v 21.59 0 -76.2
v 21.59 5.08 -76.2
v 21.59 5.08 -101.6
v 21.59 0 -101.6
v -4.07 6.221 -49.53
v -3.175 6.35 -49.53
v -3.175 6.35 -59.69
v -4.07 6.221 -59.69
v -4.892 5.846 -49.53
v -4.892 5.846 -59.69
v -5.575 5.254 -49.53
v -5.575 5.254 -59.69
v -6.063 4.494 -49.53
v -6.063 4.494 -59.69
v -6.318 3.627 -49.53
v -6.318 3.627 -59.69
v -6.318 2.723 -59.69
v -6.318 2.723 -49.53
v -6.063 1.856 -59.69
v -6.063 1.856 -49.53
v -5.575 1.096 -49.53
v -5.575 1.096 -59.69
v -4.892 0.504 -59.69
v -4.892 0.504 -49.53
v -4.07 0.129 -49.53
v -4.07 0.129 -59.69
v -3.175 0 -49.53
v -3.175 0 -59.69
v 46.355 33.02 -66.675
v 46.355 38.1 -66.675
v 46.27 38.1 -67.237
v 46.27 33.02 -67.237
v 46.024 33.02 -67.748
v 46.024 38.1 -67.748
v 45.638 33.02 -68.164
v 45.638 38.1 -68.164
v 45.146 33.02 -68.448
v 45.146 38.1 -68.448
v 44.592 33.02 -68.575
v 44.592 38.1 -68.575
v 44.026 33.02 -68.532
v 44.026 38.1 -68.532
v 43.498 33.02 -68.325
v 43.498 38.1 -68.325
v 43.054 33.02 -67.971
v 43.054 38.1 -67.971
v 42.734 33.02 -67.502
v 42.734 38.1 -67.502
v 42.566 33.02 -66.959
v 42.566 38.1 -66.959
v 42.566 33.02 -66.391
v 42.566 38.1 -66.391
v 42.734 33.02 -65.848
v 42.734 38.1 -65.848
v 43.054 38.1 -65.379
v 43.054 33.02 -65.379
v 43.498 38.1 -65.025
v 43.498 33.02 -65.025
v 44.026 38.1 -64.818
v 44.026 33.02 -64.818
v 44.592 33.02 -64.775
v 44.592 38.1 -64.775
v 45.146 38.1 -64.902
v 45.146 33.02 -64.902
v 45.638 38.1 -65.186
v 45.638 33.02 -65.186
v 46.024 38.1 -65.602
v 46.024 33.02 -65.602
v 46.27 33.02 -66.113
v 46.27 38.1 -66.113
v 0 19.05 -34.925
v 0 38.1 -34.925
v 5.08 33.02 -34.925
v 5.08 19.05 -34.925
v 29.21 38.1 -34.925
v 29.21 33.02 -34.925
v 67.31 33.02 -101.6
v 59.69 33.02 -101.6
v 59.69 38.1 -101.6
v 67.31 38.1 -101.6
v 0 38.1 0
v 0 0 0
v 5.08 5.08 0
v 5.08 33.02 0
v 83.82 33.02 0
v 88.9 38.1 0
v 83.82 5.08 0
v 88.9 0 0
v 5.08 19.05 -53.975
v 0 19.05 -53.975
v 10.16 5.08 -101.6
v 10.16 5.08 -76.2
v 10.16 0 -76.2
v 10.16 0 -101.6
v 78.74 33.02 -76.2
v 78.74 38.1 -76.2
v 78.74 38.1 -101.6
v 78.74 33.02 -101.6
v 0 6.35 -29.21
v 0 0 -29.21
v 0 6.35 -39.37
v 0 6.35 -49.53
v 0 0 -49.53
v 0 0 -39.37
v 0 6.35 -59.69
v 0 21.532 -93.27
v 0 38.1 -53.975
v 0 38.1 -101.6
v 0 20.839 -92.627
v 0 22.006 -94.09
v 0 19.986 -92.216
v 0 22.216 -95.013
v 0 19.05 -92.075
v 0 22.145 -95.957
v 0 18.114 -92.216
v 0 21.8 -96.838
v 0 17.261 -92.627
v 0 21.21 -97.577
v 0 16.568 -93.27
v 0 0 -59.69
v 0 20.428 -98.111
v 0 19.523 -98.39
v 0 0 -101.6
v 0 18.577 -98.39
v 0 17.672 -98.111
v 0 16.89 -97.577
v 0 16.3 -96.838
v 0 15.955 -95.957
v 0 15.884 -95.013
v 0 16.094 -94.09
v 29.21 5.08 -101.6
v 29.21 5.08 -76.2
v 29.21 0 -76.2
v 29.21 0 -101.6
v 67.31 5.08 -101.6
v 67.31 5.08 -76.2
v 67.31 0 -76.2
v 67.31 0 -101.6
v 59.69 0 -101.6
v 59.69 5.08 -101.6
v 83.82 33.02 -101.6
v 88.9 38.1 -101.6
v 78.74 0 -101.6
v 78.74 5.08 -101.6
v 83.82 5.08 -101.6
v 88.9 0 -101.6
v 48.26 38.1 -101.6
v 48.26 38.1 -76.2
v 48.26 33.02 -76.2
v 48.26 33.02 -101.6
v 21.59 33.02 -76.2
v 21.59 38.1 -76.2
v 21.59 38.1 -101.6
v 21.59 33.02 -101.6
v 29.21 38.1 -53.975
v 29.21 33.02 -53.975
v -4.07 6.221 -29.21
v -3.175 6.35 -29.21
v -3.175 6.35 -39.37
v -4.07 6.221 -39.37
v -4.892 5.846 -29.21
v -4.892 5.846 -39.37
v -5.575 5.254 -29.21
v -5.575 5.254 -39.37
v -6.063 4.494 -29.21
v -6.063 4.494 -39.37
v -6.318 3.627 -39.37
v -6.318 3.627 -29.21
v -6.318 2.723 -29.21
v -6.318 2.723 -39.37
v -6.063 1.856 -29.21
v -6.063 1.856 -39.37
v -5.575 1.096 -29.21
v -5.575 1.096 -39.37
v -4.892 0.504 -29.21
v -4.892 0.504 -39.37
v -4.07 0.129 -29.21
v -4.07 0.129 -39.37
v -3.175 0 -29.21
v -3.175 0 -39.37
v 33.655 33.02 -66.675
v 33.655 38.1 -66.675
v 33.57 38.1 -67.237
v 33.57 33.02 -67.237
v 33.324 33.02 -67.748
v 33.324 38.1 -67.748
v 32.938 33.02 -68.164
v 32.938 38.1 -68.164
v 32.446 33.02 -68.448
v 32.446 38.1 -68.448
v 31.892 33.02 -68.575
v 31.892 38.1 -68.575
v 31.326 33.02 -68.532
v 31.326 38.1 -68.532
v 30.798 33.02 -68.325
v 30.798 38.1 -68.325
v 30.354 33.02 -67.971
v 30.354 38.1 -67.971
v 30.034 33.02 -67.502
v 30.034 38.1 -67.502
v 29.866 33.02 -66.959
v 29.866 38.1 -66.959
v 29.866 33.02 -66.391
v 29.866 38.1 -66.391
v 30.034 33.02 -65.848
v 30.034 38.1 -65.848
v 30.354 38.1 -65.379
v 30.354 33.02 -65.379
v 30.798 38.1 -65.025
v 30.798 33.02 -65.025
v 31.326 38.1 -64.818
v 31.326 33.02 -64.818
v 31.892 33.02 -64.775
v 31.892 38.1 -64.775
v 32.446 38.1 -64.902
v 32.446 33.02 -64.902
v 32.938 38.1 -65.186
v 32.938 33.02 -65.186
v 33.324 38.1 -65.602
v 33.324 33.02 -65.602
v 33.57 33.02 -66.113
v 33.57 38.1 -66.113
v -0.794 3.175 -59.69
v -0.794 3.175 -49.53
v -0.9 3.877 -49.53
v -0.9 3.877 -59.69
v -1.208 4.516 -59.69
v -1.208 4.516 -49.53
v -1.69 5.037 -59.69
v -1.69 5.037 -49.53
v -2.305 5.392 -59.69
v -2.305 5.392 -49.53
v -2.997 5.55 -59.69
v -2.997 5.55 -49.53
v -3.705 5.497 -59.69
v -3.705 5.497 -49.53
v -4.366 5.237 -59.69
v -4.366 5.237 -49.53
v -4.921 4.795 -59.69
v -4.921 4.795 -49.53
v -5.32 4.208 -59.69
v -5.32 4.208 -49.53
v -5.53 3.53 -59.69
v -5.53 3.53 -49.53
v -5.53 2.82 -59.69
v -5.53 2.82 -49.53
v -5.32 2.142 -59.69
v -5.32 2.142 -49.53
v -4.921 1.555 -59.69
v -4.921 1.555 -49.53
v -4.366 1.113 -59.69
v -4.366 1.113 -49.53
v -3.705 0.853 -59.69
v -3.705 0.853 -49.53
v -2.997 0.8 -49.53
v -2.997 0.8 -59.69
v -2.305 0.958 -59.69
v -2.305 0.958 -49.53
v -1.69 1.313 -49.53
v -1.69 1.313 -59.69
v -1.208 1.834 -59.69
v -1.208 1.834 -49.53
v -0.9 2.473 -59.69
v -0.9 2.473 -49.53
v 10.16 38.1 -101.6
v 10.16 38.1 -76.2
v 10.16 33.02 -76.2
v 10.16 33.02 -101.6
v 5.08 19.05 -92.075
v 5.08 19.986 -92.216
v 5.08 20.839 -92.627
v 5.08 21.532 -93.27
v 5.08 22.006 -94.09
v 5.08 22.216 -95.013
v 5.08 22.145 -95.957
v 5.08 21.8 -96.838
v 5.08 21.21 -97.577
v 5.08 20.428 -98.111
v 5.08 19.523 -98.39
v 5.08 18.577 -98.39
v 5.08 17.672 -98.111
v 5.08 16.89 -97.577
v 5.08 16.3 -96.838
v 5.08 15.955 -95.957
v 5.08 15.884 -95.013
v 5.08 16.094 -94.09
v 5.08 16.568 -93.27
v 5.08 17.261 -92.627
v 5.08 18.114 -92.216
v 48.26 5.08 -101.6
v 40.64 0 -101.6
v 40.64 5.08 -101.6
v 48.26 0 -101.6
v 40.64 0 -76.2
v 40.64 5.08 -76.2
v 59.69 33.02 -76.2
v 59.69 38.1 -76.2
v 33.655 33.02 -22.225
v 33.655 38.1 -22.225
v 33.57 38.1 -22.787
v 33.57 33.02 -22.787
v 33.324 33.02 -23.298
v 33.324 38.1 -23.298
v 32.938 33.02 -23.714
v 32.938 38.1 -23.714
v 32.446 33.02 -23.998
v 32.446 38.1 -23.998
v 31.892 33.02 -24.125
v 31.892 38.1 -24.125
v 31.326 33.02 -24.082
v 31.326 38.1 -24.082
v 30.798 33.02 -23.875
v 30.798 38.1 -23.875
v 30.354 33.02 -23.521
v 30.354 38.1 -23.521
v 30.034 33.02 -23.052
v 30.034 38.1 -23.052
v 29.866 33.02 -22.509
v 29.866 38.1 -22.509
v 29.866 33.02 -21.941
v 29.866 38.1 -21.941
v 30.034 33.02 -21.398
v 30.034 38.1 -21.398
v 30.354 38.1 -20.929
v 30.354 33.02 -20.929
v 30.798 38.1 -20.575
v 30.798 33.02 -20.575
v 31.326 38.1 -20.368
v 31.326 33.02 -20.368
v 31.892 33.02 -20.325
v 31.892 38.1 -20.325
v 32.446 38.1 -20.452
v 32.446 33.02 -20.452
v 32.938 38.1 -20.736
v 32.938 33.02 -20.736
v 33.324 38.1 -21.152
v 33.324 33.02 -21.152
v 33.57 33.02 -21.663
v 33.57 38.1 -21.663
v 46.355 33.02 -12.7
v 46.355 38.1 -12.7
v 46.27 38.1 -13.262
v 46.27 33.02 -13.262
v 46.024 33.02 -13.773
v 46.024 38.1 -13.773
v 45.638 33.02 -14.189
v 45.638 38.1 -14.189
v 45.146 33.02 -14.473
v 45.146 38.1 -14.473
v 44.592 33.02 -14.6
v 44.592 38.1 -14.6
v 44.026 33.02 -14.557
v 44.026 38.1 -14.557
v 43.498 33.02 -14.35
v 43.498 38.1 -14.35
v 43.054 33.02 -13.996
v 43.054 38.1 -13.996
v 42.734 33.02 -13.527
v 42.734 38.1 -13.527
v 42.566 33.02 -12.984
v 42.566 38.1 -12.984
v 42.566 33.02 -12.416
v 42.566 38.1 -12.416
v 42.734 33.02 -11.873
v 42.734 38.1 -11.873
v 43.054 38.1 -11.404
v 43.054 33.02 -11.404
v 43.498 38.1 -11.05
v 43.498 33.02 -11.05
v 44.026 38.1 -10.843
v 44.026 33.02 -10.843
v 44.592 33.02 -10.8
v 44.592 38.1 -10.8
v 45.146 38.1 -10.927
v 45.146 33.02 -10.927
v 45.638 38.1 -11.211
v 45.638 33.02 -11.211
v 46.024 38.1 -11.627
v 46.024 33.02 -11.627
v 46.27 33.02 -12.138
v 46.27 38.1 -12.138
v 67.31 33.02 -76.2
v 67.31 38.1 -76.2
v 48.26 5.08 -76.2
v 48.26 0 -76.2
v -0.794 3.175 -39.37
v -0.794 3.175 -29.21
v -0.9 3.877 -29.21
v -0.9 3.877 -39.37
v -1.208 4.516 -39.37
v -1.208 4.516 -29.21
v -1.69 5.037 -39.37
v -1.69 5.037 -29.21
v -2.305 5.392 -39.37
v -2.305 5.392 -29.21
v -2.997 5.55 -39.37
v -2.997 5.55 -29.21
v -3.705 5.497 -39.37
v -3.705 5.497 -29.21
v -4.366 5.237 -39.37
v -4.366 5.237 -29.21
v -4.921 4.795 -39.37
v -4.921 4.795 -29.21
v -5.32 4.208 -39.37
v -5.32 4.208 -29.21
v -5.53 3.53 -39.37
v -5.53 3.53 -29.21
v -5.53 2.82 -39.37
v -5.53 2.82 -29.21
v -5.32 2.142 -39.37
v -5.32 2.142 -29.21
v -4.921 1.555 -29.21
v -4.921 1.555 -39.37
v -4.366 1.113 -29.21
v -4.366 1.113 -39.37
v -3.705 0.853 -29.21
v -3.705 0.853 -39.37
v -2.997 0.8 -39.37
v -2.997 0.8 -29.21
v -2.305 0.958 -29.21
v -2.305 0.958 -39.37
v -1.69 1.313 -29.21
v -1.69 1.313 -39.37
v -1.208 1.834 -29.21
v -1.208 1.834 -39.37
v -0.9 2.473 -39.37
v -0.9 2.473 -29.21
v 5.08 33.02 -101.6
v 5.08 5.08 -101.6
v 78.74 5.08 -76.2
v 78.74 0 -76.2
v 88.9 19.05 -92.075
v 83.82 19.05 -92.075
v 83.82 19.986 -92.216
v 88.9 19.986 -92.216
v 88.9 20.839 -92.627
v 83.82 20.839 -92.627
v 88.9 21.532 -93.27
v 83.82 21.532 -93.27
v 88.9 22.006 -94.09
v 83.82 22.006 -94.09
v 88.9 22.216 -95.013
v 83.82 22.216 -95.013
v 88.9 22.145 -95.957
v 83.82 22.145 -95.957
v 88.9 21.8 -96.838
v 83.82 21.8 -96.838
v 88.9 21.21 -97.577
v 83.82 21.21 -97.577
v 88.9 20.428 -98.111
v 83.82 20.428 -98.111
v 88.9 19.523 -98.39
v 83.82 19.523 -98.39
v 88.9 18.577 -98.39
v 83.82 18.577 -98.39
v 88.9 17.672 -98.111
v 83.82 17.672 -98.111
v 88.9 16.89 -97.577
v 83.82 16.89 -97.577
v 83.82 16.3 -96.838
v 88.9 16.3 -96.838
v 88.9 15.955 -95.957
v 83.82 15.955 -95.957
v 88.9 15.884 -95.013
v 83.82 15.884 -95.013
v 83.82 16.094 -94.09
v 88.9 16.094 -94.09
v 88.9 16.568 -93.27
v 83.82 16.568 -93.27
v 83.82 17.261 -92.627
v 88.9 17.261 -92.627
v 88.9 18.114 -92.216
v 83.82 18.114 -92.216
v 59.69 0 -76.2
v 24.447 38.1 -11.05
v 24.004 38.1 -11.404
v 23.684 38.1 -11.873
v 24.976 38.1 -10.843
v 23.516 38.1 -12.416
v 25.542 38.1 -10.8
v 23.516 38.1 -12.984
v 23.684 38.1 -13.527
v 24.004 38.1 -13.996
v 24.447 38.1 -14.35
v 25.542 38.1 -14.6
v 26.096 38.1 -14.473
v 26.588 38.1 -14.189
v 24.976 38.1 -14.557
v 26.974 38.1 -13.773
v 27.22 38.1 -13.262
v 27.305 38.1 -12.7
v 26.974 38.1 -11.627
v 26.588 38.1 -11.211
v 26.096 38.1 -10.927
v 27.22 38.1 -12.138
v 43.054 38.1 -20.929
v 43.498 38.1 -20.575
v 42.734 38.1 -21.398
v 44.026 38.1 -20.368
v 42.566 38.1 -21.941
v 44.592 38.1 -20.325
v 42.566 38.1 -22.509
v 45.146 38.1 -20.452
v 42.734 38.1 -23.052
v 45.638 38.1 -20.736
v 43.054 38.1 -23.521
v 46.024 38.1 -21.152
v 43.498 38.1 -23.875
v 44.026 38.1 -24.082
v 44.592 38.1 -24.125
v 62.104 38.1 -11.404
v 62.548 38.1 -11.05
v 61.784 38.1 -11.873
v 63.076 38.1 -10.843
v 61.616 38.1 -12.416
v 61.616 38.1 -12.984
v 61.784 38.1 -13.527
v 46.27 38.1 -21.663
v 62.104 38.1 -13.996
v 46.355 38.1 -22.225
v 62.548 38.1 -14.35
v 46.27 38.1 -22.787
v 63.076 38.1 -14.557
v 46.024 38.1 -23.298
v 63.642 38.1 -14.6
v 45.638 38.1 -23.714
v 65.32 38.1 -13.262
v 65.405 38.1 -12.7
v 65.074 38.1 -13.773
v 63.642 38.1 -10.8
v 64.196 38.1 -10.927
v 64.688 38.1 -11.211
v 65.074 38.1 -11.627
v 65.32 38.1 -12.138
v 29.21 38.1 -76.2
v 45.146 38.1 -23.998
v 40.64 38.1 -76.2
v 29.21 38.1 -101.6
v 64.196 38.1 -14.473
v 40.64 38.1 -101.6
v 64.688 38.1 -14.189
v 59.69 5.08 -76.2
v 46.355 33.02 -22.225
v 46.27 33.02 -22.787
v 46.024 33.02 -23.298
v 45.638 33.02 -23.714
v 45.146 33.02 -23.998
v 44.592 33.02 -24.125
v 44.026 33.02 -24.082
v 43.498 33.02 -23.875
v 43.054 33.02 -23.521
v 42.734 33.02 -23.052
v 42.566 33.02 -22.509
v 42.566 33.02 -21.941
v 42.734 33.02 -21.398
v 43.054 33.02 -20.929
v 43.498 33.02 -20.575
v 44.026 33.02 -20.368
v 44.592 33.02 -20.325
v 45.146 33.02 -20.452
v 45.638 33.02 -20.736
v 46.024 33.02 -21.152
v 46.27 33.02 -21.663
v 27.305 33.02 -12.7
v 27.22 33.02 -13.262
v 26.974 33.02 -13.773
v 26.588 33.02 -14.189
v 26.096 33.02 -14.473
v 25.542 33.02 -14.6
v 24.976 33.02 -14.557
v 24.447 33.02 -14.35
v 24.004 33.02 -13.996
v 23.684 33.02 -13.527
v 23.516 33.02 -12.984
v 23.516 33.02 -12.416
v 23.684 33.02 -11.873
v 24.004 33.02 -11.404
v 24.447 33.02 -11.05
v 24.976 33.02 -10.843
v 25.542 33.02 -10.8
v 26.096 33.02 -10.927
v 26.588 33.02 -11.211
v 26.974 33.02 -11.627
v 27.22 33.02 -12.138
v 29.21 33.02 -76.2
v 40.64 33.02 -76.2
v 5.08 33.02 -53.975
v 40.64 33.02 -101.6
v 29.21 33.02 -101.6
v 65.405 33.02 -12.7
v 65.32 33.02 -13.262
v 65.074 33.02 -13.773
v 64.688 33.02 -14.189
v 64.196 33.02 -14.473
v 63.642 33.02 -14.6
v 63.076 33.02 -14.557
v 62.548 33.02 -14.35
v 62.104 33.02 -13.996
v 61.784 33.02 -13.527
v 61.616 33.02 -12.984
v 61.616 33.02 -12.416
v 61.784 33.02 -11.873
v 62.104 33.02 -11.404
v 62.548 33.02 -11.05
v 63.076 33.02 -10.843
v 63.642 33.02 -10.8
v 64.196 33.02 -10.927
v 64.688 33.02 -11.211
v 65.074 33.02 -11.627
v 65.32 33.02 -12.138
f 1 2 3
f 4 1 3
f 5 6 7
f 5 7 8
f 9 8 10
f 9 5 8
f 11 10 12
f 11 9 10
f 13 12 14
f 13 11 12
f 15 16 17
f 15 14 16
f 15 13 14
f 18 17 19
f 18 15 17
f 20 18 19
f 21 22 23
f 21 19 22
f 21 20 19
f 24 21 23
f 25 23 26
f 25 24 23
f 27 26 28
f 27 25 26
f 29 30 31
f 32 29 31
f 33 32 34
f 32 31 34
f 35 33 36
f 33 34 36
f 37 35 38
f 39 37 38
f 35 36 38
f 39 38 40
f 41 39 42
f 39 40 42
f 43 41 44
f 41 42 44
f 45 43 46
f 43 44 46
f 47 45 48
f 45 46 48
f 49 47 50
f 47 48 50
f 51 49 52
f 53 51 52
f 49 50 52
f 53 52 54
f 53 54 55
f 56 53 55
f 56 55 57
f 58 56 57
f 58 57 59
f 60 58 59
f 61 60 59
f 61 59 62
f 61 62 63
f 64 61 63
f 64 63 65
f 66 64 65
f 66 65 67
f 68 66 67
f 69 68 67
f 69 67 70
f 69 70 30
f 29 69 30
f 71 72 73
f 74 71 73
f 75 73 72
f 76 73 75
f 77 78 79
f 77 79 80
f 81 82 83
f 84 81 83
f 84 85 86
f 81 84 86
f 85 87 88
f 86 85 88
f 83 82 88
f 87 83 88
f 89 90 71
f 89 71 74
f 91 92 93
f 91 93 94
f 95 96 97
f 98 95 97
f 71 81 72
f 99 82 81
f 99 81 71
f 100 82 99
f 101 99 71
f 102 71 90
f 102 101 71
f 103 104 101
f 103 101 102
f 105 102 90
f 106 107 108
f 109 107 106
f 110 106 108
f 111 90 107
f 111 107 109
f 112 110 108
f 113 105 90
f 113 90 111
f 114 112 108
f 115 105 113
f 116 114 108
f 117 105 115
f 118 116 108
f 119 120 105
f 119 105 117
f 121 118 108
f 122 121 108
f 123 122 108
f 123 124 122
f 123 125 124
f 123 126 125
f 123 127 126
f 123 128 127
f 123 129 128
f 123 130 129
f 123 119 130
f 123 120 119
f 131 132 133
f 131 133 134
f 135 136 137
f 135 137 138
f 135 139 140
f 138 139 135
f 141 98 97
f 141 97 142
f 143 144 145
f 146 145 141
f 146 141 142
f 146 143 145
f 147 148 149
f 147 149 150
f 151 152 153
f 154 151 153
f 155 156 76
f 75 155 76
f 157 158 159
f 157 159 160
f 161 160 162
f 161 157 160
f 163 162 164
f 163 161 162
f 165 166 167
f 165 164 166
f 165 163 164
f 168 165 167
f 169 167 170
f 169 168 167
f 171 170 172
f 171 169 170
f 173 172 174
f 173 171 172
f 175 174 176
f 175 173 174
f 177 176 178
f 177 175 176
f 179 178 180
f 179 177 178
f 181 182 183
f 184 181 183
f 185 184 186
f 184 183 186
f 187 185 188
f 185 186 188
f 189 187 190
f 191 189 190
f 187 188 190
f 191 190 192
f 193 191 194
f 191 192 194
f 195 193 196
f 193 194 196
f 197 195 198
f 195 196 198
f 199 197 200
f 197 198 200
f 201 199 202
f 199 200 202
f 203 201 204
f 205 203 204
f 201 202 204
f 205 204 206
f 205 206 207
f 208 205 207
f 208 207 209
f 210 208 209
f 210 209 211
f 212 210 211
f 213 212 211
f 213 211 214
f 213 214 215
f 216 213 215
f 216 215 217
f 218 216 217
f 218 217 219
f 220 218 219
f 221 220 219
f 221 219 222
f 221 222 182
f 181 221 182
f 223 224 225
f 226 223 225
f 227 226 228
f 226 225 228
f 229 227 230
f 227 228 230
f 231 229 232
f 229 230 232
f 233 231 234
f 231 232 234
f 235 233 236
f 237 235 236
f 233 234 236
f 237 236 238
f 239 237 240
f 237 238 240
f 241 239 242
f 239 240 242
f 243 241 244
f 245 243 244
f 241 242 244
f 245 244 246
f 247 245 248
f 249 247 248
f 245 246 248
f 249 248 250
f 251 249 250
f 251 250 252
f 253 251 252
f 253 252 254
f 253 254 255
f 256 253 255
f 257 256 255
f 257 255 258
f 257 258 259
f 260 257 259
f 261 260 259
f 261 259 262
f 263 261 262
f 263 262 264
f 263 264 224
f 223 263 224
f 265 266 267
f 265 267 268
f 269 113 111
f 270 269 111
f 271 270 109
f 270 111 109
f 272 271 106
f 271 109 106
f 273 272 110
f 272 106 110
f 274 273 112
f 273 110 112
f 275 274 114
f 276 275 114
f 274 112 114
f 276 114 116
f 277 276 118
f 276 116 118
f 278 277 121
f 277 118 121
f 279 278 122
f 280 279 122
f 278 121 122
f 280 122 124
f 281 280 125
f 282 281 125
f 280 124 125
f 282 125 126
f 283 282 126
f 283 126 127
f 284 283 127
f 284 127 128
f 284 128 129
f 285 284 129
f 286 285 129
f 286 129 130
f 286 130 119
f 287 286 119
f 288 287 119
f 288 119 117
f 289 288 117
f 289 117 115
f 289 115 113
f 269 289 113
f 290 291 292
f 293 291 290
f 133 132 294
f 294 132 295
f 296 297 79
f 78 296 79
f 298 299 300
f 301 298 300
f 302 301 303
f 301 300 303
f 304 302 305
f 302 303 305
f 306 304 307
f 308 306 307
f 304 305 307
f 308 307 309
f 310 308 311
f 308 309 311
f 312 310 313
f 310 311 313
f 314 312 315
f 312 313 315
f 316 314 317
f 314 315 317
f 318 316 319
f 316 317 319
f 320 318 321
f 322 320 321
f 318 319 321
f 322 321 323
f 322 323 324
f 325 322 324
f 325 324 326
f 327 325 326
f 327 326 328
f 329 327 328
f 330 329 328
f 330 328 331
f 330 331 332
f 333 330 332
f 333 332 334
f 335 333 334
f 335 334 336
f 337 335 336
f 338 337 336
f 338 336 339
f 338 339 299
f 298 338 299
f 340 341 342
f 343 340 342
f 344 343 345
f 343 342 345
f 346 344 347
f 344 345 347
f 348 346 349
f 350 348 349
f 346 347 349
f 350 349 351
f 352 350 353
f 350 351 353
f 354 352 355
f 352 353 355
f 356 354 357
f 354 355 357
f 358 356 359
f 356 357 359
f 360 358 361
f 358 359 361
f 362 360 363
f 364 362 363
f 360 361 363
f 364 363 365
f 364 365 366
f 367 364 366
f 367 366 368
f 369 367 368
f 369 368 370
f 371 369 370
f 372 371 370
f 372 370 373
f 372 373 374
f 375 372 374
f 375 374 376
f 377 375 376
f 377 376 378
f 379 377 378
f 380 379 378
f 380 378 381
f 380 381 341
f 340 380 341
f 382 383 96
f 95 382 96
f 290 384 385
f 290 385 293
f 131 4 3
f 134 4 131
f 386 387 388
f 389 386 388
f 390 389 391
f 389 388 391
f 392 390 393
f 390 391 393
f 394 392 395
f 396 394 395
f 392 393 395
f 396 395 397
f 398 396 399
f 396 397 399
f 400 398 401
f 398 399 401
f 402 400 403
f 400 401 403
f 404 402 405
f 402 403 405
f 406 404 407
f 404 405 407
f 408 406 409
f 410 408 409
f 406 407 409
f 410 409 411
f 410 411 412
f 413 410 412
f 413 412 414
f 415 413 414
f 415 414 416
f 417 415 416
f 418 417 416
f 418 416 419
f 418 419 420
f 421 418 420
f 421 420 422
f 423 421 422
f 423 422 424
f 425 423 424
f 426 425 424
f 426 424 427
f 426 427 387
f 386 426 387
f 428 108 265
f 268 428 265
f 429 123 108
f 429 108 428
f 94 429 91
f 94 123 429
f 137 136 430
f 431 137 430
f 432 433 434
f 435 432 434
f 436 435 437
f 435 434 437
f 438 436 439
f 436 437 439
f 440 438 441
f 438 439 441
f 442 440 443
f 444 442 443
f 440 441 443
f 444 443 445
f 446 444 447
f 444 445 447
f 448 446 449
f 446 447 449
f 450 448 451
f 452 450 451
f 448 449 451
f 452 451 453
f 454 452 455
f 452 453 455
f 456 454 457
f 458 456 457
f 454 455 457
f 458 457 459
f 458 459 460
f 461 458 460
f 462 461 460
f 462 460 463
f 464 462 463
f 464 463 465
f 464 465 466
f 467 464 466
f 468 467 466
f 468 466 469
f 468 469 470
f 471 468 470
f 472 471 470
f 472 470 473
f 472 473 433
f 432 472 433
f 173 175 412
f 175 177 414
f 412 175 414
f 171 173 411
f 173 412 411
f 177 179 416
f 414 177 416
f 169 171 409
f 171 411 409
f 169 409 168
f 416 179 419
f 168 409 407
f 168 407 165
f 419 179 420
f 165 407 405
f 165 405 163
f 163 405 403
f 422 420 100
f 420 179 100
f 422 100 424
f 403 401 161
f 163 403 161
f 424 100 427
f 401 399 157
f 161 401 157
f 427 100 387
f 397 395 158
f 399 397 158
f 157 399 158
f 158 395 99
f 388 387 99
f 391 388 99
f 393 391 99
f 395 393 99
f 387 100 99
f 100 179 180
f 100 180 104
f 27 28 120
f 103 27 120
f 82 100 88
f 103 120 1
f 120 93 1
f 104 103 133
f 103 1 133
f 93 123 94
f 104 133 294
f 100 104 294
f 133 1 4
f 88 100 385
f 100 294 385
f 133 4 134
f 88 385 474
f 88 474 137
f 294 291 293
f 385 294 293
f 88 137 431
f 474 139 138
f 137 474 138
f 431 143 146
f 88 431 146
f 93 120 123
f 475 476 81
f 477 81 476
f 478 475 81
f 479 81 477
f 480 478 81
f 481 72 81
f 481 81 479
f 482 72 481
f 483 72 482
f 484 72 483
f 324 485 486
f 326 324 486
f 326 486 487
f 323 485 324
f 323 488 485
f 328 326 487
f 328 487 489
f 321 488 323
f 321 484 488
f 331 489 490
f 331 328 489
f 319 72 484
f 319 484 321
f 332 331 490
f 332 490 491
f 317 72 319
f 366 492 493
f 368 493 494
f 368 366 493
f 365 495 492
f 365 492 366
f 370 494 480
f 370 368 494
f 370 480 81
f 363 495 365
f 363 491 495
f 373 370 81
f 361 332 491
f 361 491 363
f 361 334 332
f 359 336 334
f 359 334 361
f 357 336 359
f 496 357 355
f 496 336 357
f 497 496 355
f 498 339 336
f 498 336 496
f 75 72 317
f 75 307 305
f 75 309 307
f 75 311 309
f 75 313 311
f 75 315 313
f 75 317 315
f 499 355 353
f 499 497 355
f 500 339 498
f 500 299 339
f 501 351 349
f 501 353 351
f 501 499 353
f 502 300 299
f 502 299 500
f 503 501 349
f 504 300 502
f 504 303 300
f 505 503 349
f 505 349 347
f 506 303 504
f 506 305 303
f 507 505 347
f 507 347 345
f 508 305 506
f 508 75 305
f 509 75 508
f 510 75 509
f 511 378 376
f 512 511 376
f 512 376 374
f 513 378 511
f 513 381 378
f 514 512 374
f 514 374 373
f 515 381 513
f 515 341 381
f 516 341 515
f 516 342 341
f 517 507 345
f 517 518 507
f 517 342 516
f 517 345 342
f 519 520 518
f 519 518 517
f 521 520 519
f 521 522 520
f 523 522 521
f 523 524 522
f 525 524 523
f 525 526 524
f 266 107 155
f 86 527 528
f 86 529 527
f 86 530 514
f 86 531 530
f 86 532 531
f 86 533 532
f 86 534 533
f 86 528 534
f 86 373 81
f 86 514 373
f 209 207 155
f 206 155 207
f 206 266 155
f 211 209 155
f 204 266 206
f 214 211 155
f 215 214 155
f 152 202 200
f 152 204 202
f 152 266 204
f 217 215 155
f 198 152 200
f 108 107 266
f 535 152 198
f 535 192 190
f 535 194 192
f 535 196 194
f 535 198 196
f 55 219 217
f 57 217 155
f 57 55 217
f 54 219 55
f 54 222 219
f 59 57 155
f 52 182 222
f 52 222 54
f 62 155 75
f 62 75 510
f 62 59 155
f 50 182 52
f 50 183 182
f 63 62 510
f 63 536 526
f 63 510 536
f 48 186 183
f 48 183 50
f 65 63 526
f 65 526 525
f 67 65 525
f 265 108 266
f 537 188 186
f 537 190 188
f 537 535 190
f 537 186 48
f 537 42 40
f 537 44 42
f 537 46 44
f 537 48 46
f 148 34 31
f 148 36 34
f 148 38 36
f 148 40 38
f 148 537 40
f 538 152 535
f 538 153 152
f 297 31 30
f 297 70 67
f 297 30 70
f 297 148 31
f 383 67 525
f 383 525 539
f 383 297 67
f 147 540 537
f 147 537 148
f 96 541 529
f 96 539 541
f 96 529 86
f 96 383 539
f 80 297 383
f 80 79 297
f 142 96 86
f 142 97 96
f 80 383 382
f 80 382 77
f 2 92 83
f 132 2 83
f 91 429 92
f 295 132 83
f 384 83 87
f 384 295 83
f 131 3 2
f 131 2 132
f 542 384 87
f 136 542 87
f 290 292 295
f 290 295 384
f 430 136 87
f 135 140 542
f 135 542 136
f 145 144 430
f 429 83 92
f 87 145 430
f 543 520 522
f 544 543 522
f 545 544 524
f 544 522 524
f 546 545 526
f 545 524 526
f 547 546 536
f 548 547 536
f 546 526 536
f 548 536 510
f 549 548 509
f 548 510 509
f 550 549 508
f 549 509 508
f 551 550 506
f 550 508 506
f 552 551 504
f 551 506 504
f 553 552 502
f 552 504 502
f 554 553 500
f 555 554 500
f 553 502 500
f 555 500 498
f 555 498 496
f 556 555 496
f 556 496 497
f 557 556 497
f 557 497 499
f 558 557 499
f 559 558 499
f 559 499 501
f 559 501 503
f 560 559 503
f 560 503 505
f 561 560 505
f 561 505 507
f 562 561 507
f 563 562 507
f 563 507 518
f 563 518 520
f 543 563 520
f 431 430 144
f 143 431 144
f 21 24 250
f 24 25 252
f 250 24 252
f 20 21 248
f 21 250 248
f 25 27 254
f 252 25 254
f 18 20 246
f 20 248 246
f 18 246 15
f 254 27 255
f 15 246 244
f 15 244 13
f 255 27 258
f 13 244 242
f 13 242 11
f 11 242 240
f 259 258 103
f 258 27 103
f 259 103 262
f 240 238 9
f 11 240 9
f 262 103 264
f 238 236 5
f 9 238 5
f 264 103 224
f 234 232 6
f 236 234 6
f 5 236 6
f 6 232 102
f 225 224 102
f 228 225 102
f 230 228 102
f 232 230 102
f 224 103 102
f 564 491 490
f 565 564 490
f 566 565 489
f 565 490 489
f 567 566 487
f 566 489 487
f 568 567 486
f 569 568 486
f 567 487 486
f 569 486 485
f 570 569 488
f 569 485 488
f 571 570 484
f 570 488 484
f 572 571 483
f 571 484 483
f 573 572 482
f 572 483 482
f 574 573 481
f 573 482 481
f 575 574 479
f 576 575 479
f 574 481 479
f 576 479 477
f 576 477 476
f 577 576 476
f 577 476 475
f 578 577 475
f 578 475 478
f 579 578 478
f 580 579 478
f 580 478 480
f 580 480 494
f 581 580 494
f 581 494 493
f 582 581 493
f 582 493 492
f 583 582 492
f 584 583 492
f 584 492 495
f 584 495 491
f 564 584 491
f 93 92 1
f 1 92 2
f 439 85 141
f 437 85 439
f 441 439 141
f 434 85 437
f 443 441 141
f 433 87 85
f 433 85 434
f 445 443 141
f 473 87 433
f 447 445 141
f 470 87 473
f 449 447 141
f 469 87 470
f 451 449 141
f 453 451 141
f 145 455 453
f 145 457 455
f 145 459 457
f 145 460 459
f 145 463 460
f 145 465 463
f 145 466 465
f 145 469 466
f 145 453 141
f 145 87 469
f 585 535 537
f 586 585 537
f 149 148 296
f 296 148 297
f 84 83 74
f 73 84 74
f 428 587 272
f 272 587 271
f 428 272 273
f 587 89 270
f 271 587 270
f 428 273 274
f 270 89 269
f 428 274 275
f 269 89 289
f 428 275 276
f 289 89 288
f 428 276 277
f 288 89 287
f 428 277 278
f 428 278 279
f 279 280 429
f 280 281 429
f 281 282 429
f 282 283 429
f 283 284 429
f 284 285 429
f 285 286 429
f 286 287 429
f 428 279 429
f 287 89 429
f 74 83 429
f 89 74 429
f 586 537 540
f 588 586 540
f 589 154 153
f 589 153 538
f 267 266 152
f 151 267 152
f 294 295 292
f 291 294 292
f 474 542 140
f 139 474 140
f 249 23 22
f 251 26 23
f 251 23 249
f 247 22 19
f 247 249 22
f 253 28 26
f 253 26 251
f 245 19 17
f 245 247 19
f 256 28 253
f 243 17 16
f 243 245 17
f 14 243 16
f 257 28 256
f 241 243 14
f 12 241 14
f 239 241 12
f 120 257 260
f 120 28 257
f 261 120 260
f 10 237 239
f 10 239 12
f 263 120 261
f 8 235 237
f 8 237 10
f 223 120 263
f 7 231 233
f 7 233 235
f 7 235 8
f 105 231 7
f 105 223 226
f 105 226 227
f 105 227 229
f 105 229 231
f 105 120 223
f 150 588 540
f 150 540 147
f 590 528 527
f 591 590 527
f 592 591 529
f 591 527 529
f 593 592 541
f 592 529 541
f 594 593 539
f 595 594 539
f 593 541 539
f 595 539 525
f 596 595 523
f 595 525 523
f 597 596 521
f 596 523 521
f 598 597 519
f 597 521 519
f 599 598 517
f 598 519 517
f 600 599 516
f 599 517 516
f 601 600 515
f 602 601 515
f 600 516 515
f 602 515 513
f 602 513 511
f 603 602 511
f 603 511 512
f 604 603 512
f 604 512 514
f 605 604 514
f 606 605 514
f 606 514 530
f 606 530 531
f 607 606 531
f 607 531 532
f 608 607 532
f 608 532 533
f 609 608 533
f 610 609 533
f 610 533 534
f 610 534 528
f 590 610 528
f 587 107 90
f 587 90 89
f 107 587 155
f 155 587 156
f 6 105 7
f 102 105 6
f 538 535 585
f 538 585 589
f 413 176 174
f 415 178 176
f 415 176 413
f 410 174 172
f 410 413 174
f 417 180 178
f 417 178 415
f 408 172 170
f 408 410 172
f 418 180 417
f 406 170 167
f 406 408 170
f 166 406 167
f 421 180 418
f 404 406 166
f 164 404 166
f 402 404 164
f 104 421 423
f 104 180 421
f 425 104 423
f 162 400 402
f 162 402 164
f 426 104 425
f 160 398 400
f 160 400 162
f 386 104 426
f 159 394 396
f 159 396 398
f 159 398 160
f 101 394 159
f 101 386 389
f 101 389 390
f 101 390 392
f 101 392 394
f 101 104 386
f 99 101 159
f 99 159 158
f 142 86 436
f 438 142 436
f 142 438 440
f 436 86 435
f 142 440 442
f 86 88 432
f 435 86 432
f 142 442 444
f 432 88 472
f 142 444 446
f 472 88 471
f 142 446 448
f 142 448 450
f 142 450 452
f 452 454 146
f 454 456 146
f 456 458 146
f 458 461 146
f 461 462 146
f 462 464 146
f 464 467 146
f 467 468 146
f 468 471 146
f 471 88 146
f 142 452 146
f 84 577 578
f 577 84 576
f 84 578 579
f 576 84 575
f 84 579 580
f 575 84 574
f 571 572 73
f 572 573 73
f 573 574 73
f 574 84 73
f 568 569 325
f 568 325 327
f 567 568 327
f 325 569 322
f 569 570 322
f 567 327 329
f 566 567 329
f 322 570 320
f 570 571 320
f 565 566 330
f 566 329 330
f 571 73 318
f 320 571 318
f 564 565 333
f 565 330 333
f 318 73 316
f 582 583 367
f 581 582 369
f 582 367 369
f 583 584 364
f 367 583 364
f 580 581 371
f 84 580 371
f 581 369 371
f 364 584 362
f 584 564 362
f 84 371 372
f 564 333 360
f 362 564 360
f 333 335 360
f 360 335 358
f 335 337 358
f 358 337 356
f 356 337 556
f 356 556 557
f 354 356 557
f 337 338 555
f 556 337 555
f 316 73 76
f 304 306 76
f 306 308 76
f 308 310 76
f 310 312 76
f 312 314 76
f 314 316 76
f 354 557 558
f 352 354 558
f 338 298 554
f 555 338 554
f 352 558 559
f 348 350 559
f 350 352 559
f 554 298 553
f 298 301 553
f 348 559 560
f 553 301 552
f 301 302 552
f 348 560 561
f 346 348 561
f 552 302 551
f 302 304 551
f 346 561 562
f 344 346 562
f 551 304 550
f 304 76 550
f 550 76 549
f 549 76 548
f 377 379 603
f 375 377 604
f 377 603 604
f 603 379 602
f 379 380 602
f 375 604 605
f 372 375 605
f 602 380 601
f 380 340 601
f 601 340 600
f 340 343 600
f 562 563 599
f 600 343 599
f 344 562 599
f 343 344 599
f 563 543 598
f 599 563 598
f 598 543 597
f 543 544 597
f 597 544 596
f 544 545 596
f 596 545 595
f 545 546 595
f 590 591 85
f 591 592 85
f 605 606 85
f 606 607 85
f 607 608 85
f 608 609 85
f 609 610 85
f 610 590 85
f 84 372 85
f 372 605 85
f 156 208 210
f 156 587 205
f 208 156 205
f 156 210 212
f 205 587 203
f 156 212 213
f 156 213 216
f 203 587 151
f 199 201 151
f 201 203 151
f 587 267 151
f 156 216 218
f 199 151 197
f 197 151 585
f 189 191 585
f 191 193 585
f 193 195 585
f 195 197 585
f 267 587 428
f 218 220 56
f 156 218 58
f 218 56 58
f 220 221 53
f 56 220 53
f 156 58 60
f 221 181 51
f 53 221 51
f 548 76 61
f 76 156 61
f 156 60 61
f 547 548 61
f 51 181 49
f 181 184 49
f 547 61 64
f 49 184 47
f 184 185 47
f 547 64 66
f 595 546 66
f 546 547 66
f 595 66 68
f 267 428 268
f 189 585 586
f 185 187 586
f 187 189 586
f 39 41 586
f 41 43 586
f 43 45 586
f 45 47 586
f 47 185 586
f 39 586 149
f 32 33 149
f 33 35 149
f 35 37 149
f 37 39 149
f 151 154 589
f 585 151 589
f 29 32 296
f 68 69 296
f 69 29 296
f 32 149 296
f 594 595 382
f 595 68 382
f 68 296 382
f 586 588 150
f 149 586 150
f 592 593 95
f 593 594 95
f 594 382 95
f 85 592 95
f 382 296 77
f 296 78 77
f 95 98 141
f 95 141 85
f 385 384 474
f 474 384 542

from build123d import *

# Parameters (mm, degrees)
SKETCH1_W               = 88.9
SKETCH1_H               = 101.6
BOSS_EXTRUDE1_DEPTH     = 38.1
SHELL1_T                = -5.08
CUT_EXTRUDE3_START      = -19.05
SKETCH4_W               = 29.21
SKETCH4_H               = 19.05
CUT_EXTRUDE3_DEPTH      = 20.05
SKETCH5_W               = 11.43
SKETCH5_H               = 25.4
CUT_EXTRUDE4_DEPTH      = 39.1
SKETCH6_R               = 3.175
CUT_EXTRUDE5_DEPTH      = 4.2672
CUT_EXTRUDE5_DEPTH_BACK = 89.9
CUT_EXTRUDE6_REACH      = 40.1
SKETCH7_R               = 1.905
SKETCH9_W               = 10.16
SKETCH9_H               = 6.35
BOSS_EXTRUDE2_DEPTH     = 6.35
SKETCH10_R              = 2.38125
CUT_EXTRUDE7_DEPTH      = 30.48


with BuildPart() as part:
    # Sketch1 → Boss-Extrude1 (new body)
    with BuildSketch(Plane(origin=(0, 0, 0), x_dir=(1, 0, 0), z_dir=(0, 1, 0))):
        with Locations((44.45, 50.8)):
            Rectangle(SKETCH1_W, SKETCH1_H)
    extrude(amount=BOSS_EXTRUDE1_DEPTH)

    # Shell1
    shell1_openings = [part.faces().sort_by_distance(p)[0] for p in [
        (44.45, 19.05, 0),
        (44.45, 19.05, -101.6),
    ]]
    offset(amount=SHELL1_T, openings=shell1_openings, kind=Kind.INTERSECTION)

    # Sketch4 → Cut-Extrude3 (cut, through all)
    with BuildSketch(Plane.XZ.offset(CUT_EXTRUDE3_START)):
        with Locations((14.605, -44.45)):
            Rectangle(SKETCH4_W, SKETCH4_H)
    extrude(amount=-CUT_EXTRUDE3_DEPTH, mode=Mode.SUBTRACT)

    # Sketch5 → Cut-Extrude4 (cut, through all)
    with BuildSketch(Plane(origin=(0, 38.1, 0), x_dir=(1, 0, 0), z_dir=(0, 1, 0))):
        with Locations((15.875, 88.9)):
            Rectangle(SKETCH5_W, SKETCH5_H)
        with Locations((34.925, 88.9)):
            Rectangle(SKETCH5_W, SKETCH5_H)
        with Locations((53.975, 88.9)):
            Rectangle(SKETCH5_W, SKETCH5_H)
        with Locations((73.025, 88.9)):
            Rectangle(SKETCH5_W, SKETCH5_H)
    extrude(amount=-CUT_EXTRUDE4_DEPTH, mode=Mode.SUBTRACT)

    # Sketch6 → Cut-Extrude5 (cut, two sides)
    with BuildSketch(Plane.ZY) as cut_extrude5_sk:
        with Locations((-95.25, 19.05)):
            Circle(SKETCH6_R)
    extrude(amount=CUT_EXTRUDE5_DEPTH, mode=Mode.SUBTRACT)
    extrude(cut_extrude5_sk.sketch, amount=-CUT_EXTRUDE5_DEPTH_BACK, mode=Mode.SUBTRACT)

    # Sketch7 → Cut-Extrude6 (cut, up to next)
    with BuildSketch(Plane(origin=(0, 38.1, 0), x_dir=(1, 0, 0), z_dir=(0, 1, 0)), mode=Mode.PRIVATE) as cut_extrude6_sk1:
        with Locations((44.45, 12.7)):
            Circle(SKETCH7_R)
    cut_extrude6_tool1 = extrude(cut_extrude6_sk1.sketch, amount=-CUT_EXTRUDE6_REACH, mode=Mode.PRIVATE) & part.part
    add(cut_extrude6_tool1.solids().sort_by_distance((44.45, 38.1, -12.7))[0], mode=Mode.SUBTRACT)
    # Sketch7 → Cut-Extrude6 (cut, up to next)
    with BuildSketch(Plane(origin=(0, 38.1, 0), x_dir=(1, 0, 0), z_dir=(0, 1, 0)), mode=Mode.PRIVATE) as cut_extrude6_sk2:
        with Locations((25.4, 12.7)):
            Circle(SKETCH7_R)
    cut_extrude6_tool2 = extrude(cut_extrude6_sk2.sketch, amount=-CUT_EXTRUDE6_REACH, mode=Mode.PRIVATE) & part.part
    add(cut_extrude6_tool2.solids().sort_by_distance((25.4, 38.1, -12.7))[0], mode=Mode.SUBTRACT)
    # Sketch7 → Cut-Extrude6 (cut, up to next)
    with BuildSketch(Plane(origin=(0, 38.1, 0), x_dir=(1, 0, 0), z_dir=(0, 1, 0)), mode=Mode.PRIVATE) as cut_extrude6_sk3:
        with Locations((63.5, 12.7)):
            Circle(SKETCH7_R)
    cut_extrude6_tool3 = extrude(cut_extrude6_sk3.sketch, amount=-CUT_EXTRUDE6_REACH, mode=Mode.PRIVATE) & part.part
    add(cut_extrude6_tool3.solids().sort_by_distance((63.5, 38.1, -12.7))[0], mode=Mode.SUBTRACT)
    # Sketch7 → Cut-Extrude6 (cut, up to next)
    with BuildSketch(Plane(origin=(0, 38.1, 0), x_dir=(1, 0, 0), z_dir=(0, 1, 0)), mode=Mode.PRIVATE) as cut_extrude6_sk4:
        with Locations((31.75, 66.675)):
            Circle(SKETCH7_R)
    cut_extrude6_tool4 = extrude(cut_extrude6_sk4.sketch, amount=-CUT_EXTRUDE6_REACH, mode=Mode.PRIVATE) & part.part
    add(cut_extrude6_tool4.solids().sort_by_distance((31.75, 38.1, -66.675))[0], mode=Mode.SUBTRACT)
    # Sketch7 → Cut-Extrude6 (cut, up to next)
    with BuildSketch(Plane(origin=(0, 38.1, 0), x_dir=(1, 0, 0), z_dir=(0, 1, 0)), mode=Mode.PRIVATE) as cut_extrude6_sk5:
        with Locations((44.45, 66.675)):
            Circle(SKETCH7_R)
    cut_extrude6_tool5 = extrude(cut_extrude6_sk5.sketch, amount=-CUT_EXTRUDE6_REACH, mode=Mode.PRIVATE) & part.part
    add(cut_extrude6_tool5.solids().sort_by_distance((44.45, 38.1, -66.675))[0], mode=Mode.SUBTRACT)
    # Sketch7 → Cut-Extrude6 (cut, up to next)
    with BuildSketch(Plane(origin=(0, 38.1, 0), x_dir=(1, 0, 0), z_dir=(0, 1, 0)), mode=Mode.PRIVATE) as cut_extrude6_sk6:
        with Locations((44.45, 22.225)):
            Circle(SKETCH7_R)
    cut_extrude6_tool6 = extrude(cut_extrude6_sk6.sketch, amount=-CUT_EXTRUDE6_REACH, mode=Mode.PRIVATE) & part.part
    add(cut_extrude6_tool6.solids().sort_by_distance((44.45, 38.1, -22.225))[0], mode=Mode.SUBTRACT)
    # Sketch7 → Cut-Extrude6 (cut, up to next)
    with BuildSketch(Plane(origin=(0, 38.1, 0), x_dir=(1, 0, 0), z_dir=(0, 1, 0)), mode=Mode.PRIVATE) as cut_extrude6_sk7:
        with Locations((31.75, 22.225)):
            Circle(SKETCH7_R)
    cut_extrude6_tool7 = extrude(cut_extrude6_sk7.sketch, amount=-CUT_EXTRUDE6_REACH, mode=Mode.PRIVATE) & part.part
    add(cut_extrude6_tool7.solids().sort_by_distance((31.75, 38.1, -22.225))[0], mode=Mode.SUBTRACT)

    # Sketch9 → Boss-Extrude2 (add)
    with BuildSketch(Plane.ZY):
        with Locations((-34.29, 3.175)):
            Rectangle(SKETCH9_W, SKETCH9_H)
        with Locations((-54.61, 3.175)):
            Rectangle(SKETCH9_W, SKETCH9_H)
    extrude(amount=BOSS_EXTRUDE2_DEPTH)

    # Sketch10 → Cut-Extrude7 (cut)
    with BuildSketch(Plane.XY.offset(-29.21)):
        with Locations((-3.175, 3.175)):
            Circle(SKETCH10_R)
        with BuildLine():
            Line((-3.175, 7.665128061), (-3.175, 6.35))
            ThreePointArc((-3.175, 6.35), (-6.35, 3.175), (-3.175, 0))
            Line((-3.175, 0), (-3.175, -1.315128061))
            ThreePointArc((-3.175, -1.315128061), (-7.665128061, 3.175), (-3.175, 7.665128061))
        make_face()
    extrude(amount=-CUT_EXTRUDE7_DEPTH, mode=Mode.SUBTRACT)


solid = part.part
